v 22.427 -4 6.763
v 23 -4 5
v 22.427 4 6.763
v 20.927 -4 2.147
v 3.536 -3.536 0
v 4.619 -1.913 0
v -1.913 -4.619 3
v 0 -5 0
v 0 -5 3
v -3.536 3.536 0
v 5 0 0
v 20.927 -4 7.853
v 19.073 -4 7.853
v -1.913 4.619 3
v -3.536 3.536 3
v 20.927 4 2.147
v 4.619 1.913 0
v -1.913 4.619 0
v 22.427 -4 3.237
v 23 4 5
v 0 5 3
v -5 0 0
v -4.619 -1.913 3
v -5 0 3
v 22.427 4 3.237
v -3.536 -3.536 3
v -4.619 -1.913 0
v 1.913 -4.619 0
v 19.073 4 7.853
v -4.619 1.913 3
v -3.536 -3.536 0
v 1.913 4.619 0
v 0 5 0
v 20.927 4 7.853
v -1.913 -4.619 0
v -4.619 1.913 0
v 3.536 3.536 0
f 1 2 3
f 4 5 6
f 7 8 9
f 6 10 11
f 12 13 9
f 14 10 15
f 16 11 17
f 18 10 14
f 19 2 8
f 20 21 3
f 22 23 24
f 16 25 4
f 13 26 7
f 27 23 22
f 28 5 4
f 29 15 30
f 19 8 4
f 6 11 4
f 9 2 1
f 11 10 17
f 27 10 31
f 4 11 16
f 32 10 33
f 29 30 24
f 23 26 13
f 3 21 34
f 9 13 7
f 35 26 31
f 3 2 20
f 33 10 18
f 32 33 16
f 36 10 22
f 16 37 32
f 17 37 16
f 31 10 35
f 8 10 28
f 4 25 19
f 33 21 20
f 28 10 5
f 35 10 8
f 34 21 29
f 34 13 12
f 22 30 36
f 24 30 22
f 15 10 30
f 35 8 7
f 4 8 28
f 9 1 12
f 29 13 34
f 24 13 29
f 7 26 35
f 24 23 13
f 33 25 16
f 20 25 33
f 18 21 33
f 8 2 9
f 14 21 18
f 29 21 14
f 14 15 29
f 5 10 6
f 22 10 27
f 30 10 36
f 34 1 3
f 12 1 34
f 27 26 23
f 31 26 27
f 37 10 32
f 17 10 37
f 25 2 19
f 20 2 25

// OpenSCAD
// case 06: a standing and a lying cylinder — skew rims, fitted smooth bridges.
hull() { cylinder(r = 5, h = 3); translate([20, 0, 5]) rotate([90, 0, 0]) cylinder(r = 3, h = 8, center = true); }
